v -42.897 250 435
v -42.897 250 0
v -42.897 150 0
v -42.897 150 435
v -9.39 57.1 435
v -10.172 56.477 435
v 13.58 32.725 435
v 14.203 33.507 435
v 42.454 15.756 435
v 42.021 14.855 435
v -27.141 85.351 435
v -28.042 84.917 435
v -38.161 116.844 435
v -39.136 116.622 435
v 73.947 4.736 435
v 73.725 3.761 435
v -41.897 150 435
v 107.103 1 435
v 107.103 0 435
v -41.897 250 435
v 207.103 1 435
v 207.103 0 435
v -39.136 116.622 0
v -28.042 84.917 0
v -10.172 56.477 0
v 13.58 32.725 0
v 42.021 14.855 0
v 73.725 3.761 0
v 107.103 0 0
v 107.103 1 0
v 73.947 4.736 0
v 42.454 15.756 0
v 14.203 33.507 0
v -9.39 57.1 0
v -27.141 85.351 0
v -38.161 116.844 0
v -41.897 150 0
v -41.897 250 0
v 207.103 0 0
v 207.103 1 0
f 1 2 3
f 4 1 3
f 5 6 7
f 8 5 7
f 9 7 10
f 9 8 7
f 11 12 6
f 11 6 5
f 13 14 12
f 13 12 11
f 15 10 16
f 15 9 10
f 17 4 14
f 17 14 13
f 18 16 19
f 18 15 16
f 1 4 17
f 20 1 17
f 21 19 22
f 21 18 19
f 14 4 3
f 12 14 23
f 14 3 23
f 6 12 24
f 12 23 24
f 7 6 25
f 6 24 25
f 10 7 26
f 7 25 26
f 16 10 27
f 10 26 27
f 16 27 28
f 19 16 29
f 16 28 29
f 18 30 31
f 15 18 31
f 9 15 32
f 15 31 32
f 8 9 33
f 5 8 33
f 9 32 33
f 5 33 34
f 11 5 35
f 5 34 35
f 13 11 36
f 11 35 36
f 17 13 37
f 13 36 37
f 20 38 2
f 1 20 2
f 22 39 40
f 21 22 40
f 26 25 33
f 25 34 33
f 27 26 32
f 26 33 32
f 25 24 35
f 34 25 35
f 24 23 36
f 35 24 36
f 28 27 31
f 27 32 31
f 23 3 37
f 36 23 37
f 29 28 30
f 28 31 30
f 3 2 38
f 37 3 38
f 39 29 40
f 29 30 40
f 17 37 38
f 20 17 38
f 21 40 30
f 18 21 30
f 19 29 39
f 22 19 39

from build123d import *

# Parameters (mm, degrees)
BOSS_EXTRUDE1_DEPTH = 490
SKETCH3_W           = 307.381871045
SKETCH3_H           = 276.781214979
CUT_EXTRUDE1_DEPTH  = 55


with BuildPart() as part:
    # Sketch1 → Boss-Extrude1 (new body)
    with BuildSketch(Plane.XY):
        with BuildLine():
            Line((-42.896935933, 250), (-42.896935933, 150))
            ThreePointArc((-42.896935933, 150), (1.037046889, 43.933982822), (107.103064067, 0))
            Line((107.103064067, 0), (207.103064067, 0))
            Line((207.103064067, 0), (207.103064067, 1))
            Line((207.103064067, 1), (107.103064067, 1))
            ThreePointArc((107.103064067, 1), (1.74415367, 44.641089603), (-41.896935933, 150))
            Line((-41.896935933, 150), (-41.896935933, 250))
            Line((-41.896935933, 250), (-42.896935933, 250))
        make_face()
    extrude(amount=BOSS_EXTRUDE1_DEPTH)

    # Sketch3 → Cut-Extrude1 (cut)
    with BuildSketch(Plane.XY.offset(490)):
        with Locations((90.01109878, 115.028999709)):
            Rectangle(SKETCH3_W, SKETCH3_H)
    extrude(amount=-CUT_EXTRUDE1_DEPTH, mode=Mode.SUBTRACT)


solid = part.part
